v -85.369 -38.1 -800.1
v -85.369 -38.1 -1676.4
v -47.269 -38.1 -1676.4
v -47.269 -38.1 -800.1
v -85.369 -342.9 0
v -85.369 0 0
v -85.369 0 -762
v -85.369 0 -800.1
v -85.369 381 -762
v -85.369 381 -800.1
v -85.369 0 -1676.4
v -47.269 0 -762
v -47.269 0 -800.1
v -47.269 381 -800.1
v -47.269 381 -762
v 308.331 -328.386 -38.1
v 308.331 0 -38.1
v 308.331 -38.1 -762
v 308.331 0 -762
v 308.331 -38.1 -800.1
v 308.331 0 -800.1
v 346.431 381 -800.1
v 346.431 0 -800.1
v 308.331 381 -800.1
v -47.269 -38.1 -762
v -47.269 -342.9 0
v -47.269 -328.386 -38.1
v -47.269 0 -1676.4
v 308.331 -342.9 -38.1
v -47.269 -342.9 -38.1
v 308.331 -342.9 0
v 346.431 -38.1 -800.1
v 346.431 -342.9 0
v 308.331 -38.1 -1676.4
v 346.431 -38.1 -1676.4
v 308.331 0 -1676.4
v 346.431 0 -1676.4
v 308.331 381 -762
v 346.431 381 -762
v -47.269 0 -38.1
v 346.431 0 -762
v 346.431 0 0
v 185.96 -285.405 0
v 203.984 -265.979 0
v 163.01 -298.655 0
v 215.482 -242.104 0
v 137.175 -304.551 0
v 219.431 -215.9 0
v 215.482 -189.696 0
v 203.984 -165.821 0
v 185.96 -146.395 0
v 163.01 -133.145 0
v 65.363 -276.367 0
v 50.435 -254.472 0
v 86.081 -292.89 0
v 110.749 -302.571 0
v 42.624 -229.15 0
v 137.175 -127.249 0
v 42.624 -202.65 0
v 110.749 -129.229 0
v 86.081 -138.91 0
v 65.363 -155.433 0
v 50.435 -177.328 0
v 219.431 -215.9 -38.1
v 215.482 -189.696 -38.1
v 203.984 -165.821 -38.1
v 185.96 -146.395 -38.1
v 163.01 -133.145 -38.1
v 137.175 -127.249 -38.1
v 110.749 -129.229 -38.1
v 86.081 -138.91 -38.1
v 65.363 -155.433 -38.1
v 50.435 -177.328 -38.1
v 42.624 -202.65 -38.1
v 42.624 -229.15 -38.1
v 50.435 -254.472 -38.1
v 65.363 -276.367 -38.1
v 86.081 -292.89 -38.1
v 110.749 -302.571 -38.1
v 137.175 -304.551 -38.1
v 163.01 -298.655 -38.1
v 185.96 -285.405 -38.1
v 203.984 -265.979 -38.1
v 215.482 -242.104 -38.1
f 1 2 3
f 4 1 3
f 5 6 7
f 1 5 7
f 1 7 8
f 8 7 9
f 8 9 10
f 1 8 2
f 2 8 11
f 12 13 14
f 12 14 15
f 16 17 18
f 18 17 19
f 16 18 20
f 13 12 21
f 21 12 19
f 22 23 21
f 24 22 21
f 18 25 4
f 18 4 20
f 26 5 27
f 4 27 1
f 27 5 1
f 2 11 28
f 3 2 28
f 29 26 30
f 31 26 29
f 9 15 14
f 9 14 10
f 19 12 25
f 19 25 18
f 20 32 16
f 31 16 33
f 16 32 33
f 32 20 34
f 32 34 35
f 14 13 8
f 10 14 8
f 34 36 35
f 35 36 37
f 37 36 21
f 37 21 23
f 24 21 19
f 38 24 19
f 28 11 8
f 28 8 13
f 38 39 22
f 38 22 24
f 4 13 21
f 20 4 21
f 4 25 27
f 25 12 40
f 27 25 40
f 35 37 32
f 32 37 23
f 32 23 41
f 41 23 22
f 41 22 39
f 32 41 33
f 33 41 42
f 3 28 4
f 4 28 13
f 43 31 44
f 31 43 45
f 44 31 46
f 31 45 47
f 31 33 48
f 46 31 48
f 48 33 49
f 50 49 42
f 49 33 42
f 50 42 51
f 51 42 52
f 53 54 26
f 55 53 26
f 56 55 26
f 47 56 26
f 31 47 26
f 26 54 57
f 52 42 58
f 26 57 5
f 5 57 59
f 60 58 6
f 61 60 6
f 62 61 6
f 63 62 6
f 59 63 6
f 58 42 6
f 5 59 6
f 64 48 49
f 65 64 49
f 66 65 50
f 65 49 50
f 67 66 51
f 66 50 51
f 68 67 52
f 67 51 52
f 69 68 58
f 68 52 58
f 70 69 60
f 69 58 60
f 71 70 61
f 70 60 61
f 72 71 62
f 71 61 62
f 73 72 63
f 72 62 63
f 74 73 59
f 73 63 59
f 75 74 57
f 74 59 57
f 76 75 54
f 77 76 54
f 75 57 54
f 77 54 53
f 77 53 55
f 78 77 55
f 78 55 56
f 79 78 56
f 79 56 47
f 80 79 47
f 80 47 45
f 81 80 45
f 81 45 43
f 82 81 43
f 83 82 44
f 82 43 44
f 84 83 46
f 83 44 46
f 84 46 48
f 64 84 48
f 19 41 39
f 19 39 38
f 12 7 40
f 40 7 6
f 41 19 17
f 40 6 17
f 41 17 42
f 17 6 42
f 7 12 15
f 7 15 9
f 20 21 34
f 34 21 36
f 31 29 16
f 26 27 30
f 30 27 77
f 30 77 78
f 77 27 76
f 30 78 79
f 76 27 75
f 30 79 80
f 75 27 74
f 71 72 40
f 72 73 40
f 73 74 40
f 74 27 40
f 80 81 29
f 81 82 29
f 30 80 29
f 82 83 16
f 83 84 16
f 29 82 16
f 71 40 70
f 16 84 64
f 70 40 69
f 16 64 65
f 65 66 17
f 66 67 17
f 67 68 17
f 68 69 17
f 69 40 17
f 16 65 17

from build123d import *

# Parameters (mm, degrees)
F0_W      = 355.6
F0_H      = 38.1
F1_DEPTH  = 38.1
F2_W      = 38.1
F2_H      = 38.1
F3_DEPTH  = 381
F4_W      = 355.6
F4_H      = 38.1
F5_DEPTH  = 304.8
F7_DEPTH  = 38.1
F9_DEPTH  = 38.1
F10_R     = 88.9
F11_DEPTH = 38.1


with BuildPart() as f1:
    # F0 (on Front) → F1 (new body)
    with BuildSketch(Plane.XZ):
        Polygon((-47.268543, 0), (-85.368543, 0), (-85.368543, -1676.4), (-47.268543, -1676.4), (-47.268543, -800.1), (-47.268543, -762), (-47.268543, -38.1), align=None)
        with Locations((130.531457, -19.05)):
            Rectangle(F0_W, F0_H)
        Polygon((346.431457, 0), (308.331457, 0), (308.331457, -38.1), (308.331457, -762), (308.331457, -800.1), (308.331457, -1676.4), (346.431457, -1676.4), align=None)
        with Locations((130.531457, -781.05)):
            Rectangle(F0_W, F0_H)
    extrude(amount=F1_DEPTH)

    # F2 (on face) → F3 (join)
    with BuildSketch(Plane(origin=(0, 0, 0), x_dir=(-1, 0, 0), z_dir=(0, 1, 0))):
        with Locations((-327.381457, -781.05)):
            Rectangle(F2_W, F2_H)
        with Locations((66.318543, -781.05)):
            Rectangle(F2_W, F2_H)
    extrude(amount=F3_DEPTH)

    # F4 (on face) → F5 (join)
    with BuildSketch(Plane.XZ.offset(38.1)):
        Polygon((-47.268543, 0), (-85.368543, 0), (-85.368543, -800.1), (-47.268543, -800.1), (-47.268543, -38.1), align=None)
        with Locations((130.531457, -19.05)):
            Rectangle(F4_W, F4_H)
        Polygon((346.431457, 0), (308.331457, 0), (308.331457, -38.1), (308.331457, -800.1), (346.431457, -800.1), align=None)
    extrude(amount=F5_DEPTH)

    # F6 (on face) → F7 (cut)
    with BuildSketch(Plane(origin=(-85.368543, 0, 0), x_dir=(0, -1, 0), z_dir=(-1, 0, 0))):
        Polygon((342.9, 0), (38.1, -800.1), (342.9, -800.1), align=None)
    extrude(amount=-F7_DEPTH, mode=Mode.SUBTRACT)

    # F8 (on face) → F9 (cut)
    with BuildSketch(Plane.YZ.offset(346.431457)):
        Polygon((-342.9, -800.1), (-38.1, -800.1), (-342.9, 0), align=None)
    extrude(amount=-F9_DEPTH, mode=Mode.SUBTRACT)

    # F10 (on face) → F11 (cut)
    with BuildSketch(Plane.XY):
        with Locations((130.531457, -215.9)):
            Circle(F10_R)
    extrude(amount=-F11_DEPTH, mode=Mode.SUBTRACT)


solid = f1.part
